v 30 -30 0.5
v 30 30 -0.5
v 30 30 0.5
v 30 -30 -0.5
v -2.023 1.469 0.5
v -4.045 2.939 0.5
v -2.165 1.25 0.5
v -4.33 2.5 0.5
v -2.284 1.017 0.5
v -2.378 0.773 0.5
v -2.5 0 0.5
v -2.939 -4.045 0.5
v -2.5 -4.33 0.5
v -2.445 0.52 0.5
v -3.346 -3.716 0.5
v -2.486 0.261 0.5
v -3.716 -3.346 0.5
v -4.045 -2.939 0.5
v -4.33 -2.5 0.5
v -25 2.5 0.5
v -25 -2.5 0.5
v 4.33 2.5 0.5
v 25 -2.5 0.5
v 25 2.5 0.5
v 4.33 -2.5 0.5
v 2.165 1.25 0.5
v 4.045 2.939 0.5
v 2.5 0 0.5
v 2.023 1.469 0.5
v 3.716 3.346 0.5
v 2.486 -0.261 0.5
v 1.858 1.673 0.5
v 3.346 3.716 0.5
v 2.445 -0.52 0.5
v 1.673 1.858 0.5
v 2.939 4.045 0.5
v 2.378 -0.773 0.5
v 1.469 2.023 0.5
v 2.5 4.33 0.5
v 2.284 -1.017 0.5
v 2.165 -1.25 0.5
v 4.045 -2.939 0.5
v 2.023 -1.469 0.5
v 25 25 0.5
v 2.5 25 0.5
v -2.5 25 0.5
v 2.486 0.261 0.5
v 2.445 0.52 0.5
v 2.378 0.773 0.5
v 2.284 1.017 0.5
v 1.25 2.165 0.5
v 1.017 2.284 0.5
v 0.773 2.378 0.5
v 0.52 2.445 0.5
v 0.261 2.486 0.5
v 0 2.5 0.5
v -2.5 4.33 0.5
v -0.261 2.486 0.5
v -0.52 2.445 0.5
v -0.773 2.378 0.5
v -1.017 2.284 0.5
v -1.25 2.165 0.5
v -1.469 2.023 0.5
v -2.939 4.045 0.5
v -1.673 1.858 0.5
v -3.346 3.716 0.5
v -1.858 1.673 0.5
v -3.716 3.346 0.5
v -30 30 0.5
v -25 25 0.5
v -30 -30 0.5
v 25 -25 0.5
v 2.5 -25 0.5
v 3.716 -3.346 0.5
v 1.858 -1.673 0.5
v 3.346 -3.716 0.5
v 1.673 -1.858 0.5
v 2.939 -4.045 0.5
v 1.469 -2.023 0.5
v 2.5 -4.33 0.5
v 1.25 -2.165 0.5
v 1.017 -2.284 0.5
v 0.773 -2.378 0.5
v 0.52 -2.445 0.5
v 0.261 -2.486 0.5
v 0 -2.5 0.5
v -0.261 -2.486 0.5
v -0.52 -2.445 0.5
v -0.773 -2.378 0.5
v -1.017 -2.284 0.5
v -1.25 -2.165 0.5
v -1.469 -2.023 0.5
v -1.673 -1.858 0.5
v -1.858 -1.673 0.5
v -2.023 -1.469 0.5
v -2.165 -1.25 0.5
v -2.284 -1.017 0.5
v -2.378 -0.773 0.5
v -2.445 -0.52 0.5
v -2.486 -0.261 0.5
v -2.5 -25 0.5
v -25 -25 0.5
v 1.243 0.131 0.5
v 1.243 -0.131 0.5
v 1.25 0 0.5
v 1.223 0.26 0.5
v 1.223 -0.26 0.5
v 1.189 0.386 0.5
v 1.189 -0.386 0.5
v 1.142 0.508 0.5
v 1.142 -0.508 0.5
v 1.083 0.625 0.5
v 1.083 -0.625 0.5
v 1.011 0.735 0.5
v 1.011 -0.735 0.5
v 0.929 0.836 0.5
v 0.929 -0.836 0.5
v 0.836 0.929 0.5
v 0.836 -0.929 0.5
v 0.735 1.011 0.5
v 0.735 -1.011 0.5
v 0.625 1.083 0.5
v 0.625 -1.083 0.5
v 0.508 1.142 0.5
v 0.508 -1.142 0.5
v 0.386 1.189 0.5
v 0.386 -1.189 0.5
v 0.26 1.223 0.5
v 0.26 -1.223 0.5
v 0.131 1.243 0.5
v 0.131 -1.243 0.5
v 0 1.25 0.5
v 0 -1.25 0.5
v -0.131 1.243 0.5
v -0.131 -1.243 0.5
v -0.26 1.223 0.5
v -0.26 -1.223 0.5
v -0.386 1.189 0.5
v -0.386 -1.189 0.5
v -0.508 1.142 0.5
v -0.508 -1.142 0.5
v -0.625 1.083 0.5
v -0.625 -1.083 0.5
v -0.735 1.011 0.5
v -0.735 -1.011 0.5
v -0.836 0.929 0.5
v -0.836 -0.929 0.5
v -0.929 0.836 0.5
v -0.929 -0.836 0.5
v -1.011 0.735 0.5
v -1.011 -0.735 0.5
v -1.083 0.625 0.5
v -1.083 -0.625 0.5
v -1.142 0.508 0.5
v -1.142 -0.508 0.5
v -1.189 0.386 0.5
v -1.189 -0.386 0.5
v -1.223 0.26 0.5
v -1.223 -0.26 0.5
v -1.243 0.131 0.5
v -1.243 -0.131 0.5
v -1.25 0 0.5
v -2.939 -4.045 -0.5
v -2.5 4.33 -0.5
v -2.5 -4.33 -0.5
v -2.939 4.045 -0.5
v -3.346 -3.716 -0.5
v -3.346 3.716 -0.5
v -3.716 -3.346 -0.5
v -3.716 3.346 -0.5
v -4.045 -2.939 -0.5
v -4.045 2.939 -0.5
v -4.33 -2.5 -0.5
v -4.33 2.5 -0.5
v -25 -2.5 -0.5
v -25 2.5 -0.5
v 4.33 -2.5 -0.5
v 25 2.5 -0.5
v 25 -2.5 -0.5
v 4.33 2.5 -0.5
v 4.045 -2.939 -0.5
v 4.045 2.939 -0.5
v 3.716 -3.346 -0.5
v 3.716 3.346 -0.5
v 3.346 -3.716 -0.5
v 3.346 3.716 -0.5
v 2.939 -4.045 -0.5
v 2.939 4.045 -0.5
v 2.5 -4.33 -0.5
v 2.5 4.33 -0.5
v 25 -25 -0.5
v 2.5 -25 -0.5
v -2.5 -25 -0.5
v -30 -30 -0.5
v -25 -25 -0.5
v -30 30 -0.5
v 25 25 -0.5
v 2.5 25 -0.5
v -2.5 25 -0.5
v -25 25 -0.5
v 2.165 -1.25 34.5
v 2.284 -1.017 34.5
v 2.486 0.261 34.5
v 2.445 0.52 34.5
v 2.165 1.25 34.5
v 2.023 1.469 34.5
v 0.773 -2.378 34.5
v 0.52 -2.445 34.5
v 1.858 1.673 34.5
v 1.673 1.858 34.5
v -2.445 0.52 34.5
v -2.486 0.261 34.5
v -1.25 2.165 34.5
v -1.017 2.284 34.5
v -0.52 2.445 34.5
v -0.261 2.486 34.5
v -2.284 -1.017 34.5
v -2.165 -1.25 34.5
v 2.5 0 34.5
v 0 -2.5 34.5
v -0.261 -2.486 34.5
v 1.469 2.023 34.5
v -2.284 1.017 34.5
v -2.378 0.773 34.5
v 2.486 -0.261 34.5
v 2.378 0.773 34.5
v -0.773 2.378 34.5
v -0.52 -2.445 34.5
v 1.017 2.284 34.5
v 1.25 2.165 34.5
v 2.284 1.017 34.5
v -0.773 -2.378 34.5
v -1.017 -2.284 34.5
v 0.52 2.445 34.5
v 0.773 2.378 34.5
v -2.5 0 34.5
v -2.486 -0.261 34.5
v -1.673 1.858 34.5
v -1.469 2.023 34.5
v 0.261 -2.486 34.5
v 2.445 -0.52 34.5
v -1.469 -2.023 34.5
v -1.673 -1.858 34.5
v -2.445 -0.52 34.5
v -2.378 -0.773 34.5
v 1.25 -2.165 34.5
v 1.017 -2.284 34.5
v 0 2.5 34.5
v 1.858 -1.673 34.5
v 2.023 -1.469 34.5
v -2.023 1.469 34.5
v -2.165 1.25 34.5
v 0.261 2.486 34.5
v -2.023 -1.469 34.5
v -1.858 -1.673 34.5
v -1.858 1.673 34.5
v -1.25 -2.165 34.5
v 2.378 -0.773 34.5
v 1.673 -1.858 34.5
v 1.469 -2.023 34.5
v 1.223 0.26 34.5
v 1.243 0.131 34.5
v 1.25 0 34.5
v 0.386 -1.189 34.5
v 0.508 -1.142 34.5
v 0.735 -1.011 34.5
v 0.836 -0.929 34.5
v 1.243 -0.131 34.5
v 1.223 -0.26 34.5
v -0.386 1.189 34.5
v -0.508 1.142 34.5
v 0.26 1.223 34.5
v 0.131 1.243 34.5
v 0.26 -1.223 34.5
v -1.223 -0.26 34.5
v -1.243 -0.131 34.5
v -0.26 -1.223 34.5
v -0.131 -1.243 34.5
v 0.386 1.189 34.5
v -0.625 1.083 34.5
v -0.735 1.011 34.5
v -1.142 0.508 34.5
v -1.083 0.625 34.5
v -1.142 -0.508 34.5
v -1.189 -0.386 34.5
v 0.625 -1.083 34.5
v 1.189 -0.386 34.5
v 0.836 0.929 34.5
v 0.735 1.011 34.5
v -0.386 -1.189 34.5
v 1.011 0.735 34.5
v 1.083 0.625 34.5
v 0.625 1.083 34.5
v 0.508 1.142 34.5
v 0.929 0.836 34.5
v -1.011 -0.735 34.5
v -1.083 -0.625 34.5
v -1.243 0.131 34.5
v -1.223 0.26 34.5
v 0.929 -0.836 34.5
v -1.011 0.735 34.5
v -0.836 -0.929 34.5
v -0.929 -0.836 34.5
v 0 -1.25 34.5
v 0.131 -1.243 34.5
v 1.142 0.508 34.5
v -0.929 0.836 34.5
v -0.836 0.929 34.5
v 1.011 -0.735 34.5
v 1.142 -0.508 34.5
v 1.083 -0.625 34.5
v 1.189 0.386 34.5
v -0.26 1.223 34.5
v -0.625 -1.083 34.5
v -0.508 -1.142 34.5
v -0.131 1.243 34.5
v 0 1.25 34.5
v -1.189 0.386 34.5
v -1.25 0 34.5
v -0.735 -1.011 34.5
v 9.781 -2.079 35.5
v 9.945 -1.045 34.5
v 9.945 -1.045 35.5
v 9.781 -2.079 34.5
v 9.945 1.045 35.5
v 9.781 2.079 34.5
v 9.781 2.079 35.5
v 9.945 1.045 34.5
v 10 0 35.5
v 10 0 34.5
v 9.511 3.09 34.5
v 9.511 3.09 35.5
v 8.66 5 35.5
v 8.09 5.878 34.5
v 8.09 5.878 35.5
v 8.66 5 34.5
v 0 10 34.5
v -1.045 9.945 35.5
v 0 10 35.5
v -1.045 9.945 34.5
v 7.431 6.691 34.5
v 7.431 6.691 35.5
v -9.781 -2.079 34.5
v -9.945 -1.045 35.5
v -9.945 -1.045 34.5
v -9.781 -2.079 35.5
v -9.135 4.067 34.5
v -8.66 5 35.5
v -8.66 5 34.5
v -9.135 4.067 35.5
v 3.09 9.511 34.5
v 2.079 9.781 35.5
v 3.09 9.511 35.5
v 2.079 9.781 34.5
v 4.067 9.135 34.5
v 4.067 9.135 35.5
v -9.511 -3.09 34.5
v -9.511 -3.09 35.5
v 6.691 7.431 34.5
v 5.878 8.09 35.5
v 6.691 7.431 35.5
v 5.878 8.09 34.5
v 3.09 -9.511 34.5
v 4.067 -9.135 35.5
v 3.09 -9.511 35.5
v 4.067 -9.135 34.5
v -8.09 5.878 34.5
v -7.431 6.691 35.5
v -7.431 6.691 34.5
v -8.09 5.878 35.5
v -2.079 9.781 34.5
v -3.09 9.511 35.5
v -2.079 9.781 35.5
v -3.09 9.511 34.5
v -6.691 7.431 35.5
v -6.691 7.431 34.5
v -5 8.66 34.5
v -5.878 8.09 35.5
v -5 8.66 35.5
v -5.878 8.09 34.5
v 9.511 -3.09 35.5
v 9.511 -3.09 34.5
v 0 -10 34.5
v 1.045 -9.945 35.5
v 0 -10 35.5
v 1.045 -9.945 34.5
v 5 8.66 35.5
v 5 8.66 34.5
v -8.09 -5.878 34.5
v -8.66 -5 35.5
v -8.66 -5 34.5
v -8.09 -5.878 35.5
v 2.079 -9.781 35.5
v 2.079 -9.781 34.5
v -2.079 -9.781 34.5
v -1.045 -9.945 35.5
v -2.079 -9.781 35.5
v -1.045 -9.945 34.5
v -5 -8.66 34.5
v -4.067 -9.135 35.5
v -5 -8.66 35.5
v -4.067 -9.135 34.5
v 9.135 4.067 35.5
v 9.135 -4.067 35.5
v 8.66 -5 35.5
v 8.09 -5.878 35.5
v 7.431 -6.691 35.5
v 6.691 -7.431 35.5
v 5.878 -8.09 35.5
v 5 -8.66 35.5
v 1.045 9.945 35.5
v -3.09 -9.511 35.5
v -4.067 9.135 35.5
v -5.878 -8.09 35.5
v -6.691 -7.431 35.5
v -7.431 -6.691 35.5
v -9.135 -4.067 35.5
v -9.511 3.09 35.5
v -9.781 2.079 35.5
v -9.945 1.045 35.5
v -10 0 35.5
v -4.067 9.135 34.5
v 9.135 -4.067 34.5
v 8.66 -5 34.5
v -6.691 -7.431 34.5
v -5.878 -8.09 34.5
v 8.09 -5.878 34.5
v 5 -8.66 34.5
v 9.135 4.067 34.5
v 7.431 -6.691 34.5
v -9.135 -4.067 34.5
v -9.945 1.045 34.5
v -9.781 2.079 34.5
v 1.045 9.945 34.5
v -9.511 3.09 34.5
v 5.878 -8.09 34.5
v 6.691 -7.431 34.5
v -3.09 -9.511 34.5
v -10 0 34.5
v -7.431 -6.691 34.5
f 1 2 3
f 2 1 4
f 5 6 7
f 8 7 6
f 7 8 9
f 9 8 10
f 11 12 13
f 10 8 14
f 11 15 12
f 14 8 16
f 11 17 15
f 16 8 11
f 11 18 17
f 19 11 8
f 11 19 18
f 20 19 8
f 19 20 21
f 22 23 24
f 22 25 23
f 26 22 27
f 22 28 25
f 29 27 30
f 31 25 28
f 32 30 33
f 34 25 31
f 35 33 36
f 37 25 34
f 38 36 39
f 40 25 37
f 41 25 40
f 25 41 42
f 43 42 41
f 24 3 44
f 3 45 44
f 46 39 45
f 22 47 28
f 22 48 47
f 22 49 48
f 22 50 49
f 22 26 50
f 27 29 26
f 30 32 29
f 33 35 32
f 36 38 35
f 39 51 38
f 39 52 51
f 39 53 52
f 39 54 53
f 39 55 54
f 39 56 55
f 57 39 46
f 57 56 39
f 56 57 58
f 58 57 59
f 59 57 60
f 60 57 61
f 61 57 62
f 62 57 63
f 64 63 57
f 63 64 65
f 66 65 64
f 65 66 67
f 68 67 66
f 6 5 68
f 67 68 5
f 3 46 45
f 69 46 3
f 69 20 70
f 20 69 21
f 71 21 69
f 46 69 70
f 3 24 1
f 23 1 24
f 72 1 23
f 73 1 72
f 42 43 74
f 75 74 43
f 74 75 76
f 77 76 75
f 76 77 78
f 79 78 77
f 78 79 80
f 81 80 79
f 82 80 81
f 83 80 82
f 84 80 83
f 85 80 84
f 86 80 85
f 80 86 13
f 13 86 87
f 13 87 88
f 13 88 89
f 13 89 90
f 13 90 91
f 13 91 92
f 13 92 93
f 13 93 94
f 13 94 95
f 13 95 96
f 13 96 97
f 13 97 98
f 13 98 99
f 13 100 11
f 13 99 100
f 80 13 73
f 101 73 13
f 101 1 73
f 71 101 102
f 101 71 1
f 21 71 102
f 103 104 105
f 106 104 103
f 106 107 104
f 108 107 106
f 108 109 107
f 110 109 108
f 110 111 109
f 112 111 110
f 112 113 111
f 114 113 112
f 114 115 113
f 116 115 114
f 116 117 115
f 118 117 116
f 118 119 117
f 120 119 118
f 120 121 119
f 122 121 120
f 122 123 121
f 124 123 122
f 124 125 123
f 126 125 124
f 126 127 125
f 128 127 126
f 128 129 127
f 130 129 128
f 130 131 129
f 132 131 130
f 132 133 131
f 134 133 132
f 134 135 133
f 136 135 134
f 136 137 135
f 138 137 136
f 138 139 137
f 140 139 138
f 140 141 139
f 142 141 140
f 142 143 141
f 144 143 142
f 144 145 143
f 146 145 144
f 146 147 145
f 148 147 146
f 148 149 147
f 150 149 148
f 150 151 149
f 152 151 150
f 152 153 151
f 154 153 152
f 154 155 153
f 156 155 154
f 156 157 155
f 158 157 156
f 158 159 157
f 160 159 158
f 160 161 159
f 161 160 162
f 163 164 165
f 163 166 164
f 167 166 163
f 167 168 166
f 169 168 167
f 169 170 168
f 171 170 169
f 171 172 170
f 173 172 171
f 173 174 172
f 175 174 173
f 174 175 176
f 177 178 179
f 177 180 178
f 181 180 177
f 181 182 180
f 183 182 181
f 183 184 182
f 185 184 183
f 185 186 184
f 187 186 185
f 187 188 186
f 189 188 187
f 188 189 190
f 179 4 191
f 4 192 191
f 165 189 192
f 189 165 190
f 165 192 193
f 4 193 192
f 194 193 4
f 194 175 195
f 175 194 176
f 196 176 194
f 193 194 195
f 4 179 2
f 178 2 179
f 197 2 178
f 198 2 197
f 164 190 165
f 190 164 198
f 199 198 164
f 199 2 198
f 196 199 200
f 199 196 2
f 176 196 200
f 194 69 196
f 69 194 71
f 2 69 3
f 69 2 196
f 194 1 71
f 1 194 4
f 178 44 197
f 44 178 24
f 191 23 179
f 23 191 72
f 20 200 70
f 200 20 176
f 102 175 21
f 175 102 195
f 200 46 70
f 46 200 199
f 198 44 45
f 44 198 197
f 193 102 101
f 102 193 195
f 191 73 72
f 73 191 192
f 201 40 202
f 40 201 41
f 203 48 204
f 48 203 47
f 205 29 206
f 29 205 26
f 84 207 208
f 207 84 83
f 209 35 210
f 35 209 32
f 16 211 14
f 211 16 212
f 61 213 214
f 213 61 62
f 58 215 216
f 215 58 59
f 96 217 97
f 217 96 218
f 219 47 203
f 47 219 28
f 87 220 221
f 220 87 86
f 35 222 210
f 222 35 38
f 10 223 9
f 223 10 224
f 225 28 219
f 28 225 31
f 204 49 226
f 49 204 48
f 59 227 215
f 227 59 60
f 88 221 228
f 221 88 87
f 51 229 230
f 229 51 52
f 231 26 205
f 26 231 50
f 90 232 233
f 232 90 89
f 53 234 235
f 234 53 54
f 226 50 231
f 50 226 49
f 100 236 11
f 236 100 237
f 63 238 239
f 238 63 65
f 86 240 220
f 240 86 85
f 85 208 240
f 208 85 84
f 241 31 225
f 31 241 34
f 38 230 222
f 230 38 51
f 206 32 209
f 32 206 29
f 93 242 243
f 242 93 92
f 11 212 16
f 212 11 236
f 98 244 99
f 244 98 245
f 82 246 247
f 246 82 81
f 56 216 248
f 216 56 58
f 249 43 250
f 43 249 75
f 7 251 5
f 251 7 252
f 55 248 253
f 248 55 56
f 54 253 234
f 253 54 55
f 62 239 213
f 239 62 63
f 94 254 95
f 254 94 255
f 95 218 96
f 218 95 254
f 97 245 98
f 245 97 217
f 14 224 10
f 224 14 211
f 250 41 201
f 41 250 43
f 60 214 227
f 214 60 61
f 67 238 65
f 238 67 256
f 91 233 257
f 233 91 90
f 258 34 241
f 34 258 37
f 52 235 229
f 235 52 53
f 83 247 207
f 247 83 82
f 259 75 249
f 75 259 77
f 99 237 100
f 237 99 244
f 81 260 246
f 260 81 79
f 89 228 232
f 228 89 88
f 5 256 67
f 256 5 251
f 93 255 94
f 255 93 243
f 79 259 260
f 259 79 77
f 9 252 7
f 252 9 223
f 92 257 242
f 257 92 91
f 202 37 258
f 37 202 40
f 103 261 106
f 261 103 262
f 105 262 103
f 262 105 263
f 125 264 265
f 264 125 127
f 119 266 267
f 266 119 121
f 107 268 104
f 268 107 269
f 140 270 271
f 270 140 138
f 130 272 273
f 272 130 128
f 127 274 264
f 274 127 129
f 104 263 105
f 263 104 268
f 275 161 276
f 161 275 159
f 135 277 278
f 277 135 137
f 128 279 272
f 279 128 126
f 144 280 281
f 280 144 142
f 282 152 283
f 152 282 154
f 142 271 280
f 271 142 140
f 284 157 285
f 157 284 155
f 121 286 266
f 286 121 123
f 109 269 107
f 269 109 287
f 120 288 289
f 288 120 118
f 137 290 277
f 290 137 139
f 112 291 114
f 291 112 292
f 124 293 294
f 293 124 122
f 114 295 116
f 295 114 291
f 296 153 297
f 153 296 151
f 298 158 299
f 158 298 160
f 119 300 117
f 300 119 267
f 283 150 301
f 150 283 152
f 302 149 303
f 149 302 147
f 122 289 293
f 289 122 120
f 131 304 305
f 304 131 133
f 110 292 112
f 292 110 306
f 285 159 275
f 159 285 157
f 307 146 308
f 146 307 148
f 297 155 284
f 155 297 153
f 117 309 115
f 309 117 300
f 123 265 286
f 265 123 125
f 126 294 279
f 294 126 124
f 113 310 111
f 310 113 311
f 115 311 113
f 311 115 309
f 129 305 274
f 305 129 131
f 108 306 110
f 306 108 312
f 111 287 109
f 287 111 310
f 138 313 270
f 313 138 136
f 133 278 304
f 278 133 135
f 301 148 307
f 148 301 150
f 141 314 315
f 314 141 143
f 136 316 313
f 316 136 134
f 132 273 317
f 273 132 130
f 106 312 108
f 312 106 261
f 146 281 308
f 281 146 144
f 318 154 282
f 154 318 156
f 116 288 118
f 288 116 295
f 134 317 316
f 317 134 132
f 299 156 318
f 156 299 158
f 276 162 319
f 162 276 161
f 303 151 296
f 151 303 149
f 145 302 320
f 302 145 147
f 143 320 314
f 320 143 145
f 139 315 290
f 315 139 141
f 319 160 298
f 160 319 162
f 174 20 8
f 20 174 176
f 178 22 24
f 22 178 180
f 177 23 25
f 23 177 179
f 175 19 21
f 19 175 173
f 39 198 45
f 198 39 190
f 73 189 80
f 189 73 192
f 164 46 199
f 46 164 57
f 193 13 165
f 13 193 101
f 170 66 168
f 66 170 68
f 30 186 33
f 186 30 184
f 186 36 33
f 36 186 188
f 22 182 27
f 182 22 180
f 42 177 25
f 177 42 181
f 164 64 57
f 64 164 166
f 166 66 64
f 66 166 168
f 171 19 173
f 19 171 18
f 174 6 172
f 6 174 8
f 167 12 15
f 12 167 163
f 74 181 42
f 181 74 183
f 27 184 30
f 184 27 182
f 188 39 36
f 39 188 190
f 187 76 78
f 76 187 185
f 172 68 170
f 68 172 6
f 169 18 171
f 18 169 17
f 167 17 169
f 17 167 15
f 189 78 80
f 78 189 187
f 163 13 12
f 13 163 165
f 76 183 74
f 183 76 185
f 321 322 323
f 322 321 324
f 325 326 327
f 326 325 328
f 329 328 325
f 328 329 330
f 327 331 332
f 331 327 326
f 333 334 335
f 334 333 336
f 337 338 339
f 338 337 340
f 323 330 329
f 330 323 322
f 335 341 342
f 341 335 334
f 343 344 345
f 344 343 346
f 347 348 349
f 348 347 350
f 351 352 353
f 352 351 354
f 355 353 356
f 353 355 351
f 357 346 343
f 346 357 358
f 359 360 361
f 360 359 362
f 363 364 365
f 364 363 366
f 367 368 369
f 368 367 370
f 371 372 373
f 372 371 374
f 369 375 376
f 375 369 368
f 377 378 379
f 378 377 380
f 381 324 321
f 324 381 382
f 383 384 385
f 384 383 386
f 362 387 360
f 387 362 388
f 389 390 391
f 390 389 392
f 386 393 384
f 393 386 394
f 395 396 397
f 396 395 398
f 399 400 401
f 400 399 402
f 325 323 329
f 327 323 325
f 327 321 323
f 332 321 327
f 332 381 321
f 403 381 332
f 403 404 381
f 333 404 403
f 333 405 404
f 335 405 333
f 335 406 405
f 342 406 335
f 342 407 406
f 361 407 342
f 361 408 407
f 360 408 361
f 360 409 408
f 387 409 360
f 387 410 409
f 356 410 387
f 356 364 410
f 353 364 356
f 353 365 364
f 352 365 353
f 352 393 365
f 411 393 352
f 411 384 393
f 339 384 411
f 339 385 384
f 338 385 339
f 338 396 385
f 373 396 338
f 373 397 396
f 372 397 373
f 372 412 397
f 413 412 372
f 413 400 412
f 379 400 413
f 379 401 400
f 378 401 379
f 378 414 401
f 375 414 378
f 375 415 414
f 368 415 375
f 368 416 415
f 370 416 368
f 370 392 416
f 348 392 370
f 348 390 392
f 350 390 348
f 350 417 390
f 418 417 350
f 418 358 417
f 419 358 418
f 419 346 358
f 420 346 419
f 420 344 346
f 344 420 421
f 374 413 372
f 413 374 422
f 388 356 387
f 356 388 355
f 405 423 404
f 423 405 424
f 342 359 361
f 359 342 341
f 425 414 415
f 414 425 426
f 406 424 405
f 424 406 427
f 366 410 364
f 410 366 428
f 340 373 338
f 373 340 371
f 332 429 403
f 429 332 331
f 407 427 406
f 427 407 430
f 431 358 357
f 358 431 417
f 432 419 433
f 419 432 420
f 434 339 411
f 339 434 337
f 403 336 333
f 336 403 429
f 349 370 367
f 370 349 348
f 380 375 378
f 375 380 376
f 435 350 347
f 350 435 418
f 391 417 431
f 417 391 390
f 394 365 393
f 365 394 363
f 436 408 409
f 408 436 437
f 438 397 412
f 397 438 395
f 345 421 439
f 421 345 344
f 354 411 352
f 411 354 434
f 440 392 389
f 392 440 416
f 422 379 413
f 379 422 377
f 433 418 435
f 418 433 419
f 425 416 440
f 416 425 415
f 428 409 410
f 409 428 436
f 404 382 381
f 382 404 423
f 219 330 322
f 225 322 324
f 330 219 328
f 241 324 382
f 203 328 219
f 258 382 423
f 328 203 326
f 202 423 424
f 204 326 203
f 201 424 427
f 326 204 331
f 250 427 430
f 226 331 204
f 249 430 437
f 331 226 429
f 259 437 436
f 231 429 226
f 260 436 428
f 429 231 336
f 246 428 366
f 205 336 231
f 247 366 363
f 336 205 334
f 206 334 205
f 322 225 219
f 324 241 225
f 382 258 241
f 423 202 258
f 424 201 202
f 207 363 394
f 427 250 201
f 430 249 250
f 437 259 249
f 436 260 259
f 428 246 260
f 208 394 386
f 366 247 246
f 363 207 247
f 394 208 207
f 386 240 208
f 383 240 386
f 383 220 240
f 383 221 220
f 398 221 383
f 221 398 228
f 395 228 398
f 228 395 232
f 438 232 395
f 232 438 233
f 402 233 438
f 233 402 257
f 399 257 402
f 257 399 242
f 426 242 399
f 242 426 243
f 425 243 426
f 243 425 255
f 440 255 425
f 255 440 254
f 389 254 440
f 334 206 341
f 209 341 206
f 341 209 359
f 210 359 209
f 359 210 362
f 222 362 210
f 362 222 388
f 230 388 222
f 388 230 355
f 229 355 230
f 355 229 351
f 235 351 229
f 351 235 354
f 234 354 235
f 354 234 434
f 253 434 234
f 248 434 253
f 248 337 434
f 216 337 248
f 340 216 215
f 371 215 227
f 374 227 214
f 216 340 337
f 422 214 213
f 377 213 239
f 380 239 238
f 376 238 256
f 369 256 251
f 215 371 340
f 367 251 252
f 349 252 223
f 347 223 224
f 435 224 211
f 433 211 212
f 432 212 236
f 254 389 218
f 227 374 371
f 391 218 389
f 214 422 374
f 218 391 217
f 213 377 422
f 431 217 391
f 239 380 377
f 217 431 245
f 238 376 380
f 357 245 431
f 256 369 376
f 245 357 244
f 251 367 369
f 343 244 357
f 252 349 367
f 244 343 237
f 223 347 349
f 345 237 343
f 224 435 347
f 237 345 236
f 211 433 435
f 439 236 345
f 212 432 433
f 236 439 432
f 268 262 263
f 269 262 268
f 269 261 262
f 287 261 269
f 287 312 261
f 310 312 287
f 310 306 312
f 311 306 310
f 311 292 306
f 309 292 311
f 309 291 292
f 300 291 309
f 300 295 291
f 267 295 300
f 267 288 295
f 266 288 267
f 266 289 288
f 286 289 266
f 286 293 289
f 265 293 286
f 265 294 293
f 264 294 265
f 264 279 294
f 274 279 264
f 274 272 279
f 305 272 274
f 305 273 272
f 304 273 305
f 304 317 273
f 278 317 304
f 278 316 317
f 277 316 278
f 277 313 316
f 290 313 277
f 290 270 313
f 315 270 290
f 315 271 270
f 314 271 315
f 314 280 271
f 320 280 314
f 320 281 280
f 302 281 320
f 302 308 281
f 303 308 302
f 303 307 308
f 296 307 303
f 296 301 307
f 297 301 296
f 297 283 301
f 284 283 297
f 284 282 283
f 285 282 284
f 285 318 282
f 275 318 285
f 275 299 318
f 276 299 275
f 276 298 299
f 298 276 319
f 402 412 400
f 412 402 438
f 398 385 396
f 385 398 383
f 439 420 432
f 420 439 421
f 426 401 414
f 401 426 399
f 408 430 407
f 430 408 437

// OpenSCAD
// Rod Height
rod_height = 35; // [1:150]

// Rod Diameter
rod_diameter=5; // [2:20]

// Wall Cylinder Base Diameter
base_diameter = 20; // [10:100]

// Photo Frame Base Width
frame_width=60; // [10:150]

/* [Hidden] */

$fn=60;
rod_half=rod_height/2;

quarter_frame=(frame_width-(rod_diameter*3))/2;

difference()
{
    cube([frame_width,frame_width,1], center=true);
    cube([frame_width-(rod_diameter*2),frame_width-(rod_diameter*2),1], center=true);
}

cube([frame_width,rod_diameter,1], center=true);
cube([rod_diameter,frame_width,1], center=true);
cylinder(h=1, r=rod_diameter, center=true);

translate([0,0,rod_half]) 
{
    difference()
    {
        cylinder(h=rod_height, r=rod_diameter/2, center=true);
        cylinder(h=rod_height, r=rod_diameter/4, center=true);
    }
}

translate([0,0,rod_height])
{
    cylinder(h=1,r=base_diameter/2, center=true);
}
